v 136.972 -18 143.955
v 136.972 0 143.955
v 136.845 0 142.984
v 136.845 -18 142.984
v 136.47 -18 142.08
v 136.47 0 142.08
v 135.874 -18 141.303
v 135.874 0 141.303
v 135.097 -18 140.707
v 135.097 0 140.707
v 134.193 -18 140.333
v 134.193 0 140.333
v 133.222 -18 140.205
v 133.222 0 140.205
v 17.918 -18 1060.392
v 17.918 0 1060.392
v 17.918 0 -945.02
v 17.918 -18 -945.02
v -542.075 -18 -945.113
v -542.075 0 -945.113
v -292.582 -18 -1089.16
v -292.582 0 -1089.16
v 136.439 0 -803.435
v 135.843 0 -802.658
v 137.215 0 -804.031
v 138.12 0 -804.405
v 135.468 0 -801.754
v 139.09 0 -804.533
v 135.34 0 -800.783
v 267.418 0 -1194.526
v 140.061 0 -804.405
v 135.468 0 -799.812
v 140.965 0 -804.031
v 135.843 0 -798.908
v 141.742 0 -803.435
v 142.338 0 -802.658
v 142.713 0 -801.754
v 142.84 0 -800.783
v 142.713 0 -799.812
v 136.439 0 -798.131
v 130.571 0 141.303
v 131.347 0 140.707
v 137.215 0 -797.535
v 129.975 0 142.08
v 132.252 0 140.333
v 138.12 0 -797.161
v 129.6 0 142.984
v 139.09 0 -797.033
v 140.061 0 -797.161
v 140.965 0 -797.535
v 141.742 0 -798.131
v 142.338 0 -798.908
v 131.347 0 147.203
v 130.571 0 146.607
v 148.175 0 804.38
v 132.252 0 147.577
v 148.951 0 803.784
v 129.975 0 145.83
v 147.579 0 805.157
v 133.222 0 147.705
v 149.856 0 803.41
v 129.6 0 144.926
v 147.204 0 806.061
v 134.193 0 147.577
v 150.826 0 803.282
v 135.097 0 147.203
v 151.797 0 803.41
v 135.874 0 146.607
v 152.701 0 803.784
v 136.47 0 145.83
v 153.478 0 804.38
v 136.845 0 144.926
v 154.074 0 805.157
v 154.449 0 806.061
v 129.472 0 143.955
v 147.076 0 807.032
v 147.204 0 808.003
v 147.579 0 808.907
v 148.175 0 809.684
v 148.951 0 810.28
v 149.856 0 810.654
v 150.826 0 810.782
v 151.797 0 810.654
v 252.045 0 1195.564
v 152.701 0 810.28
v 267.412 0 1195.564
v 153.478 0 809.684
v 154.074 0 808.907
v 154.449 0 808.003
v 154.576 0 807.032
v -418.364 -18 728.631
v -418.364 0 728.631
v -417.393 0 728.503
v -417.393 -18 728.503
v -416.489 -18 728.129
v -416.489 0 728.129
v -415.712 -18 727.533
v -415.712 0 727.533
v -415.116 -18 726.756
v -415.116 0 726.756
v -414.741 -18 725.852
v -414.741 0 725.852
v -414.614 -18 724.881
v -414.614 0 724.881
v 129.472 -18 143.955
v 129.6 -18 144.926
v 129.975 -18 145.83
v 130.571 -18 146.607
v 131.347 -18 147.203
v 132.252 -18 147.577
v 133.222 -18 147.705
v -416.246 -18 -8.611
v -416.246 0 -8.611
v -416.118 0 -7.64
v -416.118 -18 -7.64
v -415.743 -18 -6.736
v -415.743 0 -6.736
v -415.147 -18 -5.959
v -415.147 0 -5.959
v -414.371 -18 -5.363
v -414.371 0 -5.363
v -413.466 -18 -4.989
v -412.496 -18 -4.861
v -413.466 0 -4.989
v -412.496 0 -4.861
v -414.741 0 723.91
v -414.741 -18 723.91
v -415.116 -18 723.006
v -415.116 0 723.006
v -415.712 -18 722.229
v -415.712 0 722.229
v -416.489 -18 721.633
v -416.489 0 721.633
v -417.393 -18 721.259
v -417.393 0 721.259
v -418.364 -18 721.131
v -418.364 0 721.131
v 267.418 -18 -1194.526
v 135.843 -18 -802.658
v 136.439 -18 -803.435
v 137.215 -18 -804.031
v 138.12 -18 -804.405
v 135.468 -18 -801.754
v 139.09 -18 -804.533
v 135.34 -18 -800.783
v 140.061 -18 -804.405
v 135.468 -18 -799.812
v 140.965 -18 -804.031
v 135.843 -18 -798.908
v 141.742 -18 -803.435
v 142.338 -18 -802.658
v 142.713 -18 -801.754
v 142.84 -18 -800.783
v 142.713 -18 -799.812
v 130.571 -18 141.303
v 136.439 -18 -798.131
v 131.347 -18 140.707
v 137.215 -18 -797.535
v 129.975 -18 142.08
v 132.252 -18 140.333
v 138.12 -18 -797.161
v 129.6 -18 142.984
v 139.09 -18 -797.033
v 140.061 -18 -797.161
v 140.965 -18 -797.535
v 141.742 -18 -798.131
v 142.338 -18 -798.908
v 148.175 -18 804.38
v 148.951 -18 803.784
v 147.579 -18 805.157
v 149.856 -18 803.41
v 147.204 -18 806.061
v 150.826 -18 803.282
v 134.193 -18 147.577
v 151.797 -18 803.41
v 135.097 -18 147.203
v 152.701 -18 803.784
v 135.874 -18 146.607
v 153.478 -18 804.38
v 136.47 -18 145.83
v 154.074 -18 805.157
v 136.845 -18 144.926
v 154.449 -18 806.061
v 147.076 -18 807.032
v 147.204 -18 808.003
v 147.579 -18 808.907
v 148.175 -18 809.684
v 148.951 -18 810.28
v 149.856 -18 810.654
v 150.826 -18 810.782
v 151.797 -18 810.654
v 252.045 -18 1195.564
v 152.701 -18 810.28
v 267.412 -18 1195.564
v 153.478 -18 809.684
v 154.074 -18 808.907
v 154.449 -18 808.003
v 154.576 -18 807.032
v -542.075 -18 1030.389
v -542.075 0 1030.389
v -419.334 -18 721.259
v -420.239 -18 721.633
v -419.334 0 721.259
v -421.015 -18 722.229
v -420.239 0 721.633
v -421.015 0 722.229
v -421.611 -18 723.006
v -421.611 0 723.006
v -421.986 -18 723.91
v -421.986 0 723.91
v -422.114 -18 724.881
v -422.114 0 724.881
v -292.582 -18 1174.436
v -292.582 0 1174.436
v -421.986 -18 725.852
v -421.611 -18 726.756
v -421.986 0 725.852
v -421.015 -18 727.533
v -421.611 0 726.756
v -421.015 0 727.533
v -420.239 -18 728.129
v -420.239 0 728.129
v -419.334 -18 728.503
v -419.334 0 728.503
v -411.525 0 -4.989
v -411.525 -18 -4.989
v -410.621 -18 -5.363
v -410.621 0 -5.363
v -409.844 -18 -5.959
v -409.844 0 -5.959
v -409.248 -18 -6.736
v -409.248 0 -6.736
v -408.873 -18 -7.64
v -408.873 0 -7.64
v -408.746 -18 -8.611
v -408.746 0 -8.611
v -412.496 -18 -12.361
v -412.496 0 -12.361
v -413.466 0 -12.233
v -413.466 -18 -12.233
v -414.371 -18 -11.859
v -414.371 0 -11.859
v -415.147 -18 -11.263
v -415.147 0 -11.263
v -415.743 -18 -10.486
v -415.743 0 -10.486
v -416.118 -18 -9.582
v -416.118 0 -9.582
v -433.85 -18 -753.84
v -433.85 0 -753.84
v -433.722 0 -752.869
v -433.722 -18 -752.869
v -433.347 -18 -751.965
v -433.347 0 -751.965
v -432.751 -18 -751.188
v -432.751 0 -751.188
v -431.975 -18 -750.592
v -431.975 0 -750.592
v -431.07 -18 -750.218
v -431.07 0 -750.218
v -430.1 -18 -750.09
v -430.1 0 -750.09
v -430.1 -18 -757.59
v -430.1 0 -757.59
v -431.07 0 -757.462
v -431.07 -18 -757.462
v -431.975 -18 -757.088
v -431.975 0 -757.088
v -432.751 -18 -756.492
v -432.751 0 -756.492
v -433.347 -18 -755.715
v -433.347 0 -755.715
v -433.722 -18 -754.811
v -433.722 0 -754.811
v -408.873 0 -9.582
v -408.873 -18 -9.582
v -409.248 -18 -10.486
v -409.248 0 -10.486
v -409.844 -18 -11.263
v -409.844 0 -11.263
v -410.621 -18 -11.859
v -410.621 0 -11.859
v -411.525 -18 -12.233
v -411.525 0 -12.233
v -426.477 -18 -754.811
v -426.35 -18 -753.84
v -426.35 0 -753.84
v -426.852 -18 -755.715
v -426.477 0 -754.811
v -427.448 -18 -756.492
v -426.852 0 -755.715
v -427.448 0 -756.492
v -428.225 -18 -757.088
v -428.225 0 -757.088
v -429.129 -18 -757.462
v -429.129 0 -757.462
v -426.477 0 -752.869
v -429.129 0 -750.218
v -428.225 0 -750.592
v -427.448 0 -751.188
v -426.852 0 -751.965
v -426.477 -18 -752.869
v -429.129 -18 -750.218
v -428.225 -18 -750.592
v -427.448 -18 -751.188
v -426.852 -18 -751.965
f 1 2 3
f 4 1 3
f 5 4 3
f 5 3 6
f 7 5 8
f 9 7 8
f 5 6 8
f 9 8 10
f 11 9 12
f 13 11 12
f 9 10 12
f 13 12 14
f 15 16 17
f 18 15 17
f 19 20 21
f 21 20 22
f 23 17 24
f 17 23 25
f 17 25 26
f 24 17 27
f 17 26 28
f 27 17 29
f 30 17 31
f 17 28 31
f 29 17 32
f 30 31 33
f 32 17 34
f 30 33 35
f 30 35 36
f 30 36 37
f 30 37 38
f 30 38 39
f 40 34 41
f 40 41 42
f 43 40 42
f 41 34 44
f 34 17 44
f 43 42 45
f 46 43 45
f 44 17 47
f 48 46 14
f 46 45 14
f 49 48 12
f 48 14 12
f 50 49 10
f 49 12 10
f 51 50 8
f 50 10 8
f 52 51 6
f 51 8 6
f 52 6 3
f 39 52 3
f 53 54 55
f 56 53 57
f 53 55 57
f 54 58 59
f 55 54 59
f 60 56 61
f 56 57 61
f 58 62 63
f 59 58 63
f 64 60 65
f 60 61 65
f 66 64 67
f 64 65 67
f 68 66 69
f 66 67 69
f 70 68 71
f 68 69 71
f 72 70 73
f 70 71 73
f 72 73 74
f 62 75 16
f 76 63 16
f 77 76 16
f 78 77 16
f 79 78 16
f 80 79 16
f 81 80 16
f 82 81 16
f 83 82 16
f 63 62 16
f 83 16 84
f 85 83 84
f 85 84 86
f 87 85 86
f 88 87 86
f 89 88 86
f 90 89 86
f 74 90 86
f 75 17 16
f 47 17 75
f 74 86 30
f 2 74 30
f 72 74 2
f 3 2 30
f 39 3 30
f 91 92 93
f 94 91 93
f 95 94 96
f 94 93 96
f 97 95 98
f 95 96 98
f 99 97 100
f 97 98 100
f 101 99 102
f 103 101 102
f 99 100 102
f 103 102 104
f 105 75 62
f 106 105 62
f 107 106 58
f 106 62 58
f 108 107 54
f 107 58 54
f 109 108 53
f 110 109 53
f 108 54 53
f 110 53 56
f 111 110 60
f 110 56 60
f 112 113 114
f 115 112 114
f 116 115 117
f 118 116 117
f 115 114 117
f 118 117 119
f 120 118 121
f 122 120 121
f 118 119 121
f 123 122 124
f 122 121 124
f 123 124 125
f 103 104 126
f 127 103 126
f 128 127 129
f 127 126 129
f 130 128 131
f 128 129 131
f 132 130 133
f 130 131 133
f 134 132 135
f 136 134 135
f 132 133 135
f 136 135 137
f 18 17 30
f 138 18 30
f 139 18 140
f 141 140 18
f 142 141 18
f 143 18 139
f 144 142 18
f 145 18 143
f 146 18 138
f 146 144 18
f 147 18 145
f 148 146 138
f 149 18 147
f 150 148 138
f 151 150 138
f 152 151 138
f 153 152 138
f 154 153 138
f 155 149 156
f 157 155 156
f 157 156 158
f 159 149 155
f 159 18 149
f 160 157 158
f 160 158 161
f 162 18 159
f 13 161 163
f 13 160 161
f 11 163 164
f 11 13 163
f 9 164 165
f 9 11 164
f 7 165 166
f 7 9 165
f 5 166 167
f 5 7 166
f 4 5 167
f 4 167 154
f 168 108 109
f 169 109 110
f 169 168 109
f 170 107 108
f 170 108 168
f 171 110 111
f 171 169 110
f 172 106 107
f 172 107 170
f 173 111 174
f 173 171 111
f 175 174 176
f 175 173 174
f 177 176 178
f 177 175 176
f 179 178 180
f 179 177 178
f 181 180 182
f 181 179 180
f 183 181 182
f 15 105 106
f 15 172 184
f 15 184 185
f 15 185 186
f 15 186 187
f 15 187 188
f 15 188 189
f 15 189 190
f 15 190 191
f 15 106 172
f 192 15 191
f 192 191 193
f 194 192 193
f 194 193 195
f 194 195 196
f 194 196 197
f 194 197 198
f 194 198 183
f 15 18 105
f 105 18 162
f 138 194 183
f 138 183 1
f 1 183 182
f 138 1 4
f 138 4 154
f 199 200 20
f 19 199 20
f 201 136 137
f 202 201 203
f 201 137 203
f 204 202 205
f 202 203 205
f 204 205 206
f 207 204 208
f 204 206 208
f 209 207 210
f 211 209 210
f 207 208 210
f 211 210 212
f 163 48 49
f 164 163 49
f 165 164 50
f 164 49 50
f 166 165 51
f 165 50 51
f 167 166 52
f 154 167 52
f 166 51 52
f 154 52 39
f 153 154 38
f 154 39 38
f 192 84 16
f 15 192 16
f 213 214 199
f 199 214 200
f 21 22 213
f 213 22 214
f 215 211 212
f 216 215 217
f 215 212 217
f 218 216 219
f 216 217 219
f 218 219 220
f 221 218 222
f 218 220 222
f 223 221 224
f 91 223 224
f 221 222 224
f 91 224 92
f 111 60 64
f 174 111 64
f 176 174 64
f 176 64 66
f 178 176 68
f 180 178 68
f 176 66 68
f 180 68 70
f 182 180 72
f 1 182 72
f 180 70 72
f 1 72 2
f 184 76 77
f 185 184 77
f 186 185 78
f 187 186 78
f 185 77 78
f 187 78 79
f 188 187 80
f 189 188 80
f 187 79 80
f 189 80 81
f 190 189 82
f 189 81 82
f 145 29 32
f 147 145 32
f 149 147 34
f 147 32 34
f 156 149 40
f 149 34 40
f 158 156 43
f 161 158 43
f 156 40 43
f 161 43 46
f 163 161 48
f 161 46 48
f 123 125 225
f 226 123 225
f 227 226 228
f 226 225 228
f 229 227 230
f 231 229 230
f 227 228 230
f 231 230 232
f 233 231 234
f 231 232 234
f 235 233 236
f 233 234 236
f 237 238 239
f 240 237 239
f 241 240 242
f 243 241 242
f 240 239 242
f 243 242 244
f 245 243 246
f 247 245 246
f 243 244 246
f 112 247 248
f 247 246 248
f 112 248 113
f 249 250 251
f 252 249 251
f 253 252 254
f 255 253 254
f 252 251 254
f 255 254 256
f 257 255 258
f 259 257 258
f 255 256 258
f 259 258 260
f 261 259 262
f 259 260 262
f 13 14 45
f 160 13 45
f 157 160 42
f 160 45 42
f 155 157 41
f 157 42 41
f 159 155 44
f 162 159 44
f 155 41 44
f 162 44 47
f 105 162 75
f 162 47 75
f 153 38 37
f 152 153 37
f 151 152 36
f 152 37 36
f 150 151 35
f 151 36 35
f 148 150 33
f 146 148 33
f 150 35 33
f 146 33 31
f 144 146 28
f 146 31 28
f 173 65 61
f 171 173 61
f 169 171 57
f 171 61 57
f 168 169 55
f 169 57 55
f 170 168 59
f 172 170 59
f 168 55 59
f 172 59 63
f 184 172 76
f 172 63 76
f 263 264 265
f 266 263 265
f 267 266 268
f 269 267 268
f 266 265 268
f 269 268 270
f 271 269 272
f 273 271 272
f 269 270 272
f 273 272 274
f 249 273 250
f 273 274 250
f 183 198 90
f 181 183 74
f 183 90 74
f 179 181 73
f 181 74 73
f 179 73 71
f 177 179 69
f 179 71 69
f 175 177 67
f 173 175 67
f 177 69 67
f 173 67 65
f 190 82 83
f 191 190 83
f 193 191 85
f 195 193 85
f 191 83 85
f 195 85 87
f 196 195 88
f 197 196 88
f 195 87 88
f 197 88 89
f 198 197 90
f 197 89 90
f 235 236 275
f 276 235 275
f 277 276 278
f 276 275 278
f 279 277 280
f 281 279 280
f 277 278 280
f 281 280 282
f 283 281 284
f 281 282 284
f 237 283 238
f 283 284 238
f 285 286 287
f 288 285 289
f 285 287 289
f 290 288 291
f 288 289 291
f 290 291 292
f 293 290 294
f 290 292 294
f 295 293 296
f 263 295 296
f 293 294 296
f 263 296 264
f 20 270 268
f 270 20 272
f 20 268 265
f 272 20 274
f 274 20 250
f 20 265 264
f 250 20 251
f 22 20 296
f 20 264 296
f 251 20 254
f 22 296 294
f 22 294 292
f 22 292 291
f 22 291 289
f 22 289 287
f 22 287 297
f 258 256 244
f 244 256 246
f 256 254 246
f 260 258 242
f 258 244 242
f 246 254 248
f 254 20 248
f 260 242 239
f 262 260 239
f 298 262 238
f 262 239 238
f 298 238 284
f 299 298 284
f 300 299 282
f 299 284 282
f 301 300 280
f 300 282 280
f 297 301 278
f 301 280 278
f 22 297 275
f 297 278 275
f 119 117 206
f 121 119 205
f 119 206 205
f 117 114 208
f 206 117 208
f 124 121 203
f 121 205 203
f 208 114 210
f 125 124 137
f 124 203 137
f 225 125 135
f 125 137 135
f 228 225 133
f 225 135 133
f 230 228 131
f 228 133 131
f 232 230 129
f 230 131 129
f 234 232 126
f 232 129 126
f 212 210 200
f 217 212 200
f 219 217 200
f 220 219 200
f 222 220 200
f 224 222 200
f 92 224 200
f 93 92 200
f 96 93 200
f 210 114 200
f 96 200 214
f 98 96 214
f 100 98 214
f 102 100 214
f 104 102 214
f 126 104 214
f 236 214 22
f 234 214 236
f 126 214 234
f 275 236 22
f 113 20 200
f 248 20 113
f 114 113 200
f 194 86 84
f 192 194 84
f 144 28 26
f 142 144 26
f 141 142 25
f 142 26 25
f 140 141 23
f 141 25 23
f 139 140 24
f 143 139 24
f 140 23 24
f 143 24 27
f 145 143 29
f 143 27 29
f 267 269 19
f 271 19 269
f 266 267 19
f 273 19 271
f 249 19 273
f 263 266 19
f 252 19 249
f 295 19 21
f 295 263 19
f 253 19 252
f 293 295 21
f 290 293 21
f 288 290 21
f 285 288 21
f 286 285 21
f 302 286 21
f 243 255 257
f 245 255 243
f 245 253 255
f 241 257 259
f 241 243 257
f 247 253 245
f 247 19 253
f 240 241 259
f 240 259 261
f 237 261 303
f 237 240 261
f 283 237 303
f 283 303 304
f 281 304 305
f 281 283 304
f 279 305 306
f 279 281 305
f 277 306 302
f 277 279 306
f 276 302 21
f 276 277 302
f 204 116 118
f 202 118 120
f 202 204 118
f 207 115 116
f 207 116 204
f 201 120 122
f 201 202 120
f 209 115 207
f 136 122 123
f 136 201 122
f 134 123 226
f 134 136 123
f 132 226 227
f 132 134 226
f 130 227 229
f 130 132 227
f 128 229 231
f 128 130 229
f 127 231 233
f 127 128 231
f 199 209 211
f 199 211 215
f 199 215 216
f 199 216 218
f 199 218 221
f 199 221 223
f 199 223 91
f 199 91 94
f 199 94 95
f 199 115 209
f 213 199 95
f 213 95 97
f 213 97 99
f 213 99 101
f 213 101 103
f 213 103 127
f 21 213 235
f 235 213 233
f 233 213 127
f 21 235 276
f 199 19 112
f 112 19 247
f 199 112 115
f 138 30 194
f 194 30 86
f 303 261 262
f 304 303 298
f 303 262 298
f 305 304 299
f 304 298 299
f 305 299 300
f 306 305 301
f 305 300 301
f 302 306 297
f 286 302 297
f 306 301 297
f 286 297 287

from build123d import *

# Parameters (mm, degrees)
F1_DEPTH = 18
F2_DEPTH = 18


with BuildPart() as f1:
    # F0 (on Front) → F1 (new body)
    with BuildSketch(Plane.XZ):
        Polygon((-292.581528, -1089.160221), (-292.581526, 1174.435994), (-542.074506, 1030.389004), (-542.075497, -945.112988), align=None)
        with BuildLine():
            ThreePointArc((-433.849526, -753.840006), (-432.751176, -751.188356), (-430.099526, -750.090006))
            ThreePointArc((-430.099526, -750.090006), (-427.447876, -751.188356), (-426.349526, -753.840006))
            ThreePointArc((-426.349526, -753.840006), (-427.447876, -756.491656), (-430.099526, -757.590006))
            ThreePointArc((-430.099526, -757.590006), (-432.751176, -756.491656), (-433.849526, -753.840006))
        make_face(mode=Mode.SUBTRACT)
        with BuildLine():
            ThreePointArc((-416.245526, -8.611006), (-415.147176, -5.959356), (-412.495526, -4.861006))
            ThreePointArc((-412.495526, -4.861006), (-409.843876, -5.959356), (-408.745526, -8.611006))
            ThreePointArc((-408.745526, -8.611006), (-409.843876, -11.262656), (-412.495526, -12.361006))
            ThreePointArc((-412.495526, -12.361006), (-415.147176, -11.262656), (-416.245526, -8.611006))
        make_face(mode=Mode.SUBTRACT)
        Polygon((-428.823632, 92.789807), (-428.8264, 93.203596), (-428.829803, 93.623463), (-428.822563, 94.042433), (-428.804756, 94.460314), (-428.776457, 94.876914), (-428.737742, 95.292039), (-428.688687, 95.705497), (-428.629367, 96.117094), (-428.559858, 96.526638), (-428.480236, 96.933936), (-428.390576, 97.338795), (-428.290955, 97.741022), (-428.181447, 98.140424), (-428.062128, 98.536809), (-427.933075, 98.929984), (-427.794363, 99.319755), (-427.646067, 99.70593), (-427.488263, 100.088315), (-427.321027, 100.466719), (-427.144434, 100.840948), (-426.958561, 101.21081), (-426.763483, 101.576111), (-426.559276, 101.936658), (-426.346014, 102.292259), (-426.123775, 102.642721), (-425.892633, 102.987851), (-425.652665, 103.327456), (-425.403946, 103.661344), (-425.146551, 103.98932), (-424.880557, 104.311193), (-424.606039, 104.62677), (-424.323072, 104.935858), (-424.031733, 105.238263), (-423.651452, 105.588123), (-423.263264, 105.927644), (-422.867403, 106.256738), (-422.464103, 106.575315), (-422.053598, 106.883287), (-421.636122, 107.180564), (-421.211908, 107.467058), (-420.781192, 107.74268), (-420.344205, 108.007341), (-419.901183, 108.260952), (-419.452359, 108.503424), (-418.997968, 108.734669), (-418.538242, 108.954598), (-418.073416, 109.163121), (-417.603724, 109.36015), (-417.1294, 109.545596), (-416.650677, 109.71937), (-416.16779, 109.881384), (-415.680972, 110.031548), (-415.190457, 110.169773), (-414.69648, 110.295971), (-414.199273, 110.410053), (-413.699071, 110.51193), (-413.196108, 110.601513), (-412.690618, 110.678713), (-412.182834, 110.743441), (-411.672991, 110.795609), (-411.161322, 110.835127), (-410.648061, 110.861908), (-410.133442, 110.875861), (-409.617699, 110.876898), (-409.101067, 110.86493), (-408.539946, 110.881001), (-407.979756, 110.882779), (-407.420757, 110.870361), (-406.863207, 110.843846), (-406.307367, 110.803331), (-405.753494, 110.748914), (-405.20185, 110.680692), (-404.652692, 110.598763), (-404.10628, 110.503225), (-403.562873, 110.394174), (-403.022731, 110.27171), (-402.486113, 110.13593), (-401.953279, 109.98693), (-401.424486, 109.82481), (-400.899996, 109.649666), (-400.380067, 109.461596), (-399.864957, 109.260698), (-399.354928, 109.04707), (-398.850237, 108.820809), (-398.351145, 108.582013), (-397.85791, 108.330779), (-397.370791, 108.067206), (-396.890049, 107.79139), (-396.415942, 107.50343), (-395.948729, 107.203422), (-395.48867, 106.891466), (-395.036024, 106.567658), (-394.591051, 106.232096), (-394.154009, 105.884878), (-393.725158, 105.526101), (-393.304758, 105.155864), (-392.893067, 104.774263), (-392.602393, 104.488514), (-392.319925, 104.195899), (-392.045746, 103.896613), (-391.779936, 103.590851), (-391.522578, 103.278811), (-391.273752, 102.960687), (-391.033541, 102.636675), (-390.802025, 102.306971), (-390.579287, 101.971771), (-390.365407, 101.631271), (-390.160468, 101.285667), (-389.964551, 100.935154), (-389.777737, 100.579927), (-389.600109, 100.220184), (-389.431747, 99.85612), (-389.272733, 99.48793), (-389.123149, 99.11581), (-388.983076, 98.739956), (-388.852596, 98.360565), (-388.731791, 97.977831), (-388.620741, 97.59195), (-388.519528, 97.203119), (-388.428235, 96.811533), (-388.346942, 96.417388), (-388.275731, 96.02088), (-388.214683, 95.622204), (-388.163881, 95.221556), (-388.123405, 94.819133), (-388.093338, 94.415129), (-388.07376, 94.009741), (-388.064754, 93.603165), (-388.0664, 93.195596), (-388.070073, 92.781348), (-388.084537, 92.368236), (-388.109707, 91.956457), (-388.145499, 91.546211), (-388.191828, 91.137695), (-388.248609, 90.731108), (-388.315758, 90.326648), (-388.393192, 89.924513), (-388.480824, 89.524901), (-388.578571, 89.128012), (-388.686349, 88.734042), (-388.804072, 88.34319), (-388.931656, 87.955655), (-389.069018, 87.571634), (-389.216072, 87.191326), (-389.372733, 86.81493), (-389.538918, 86.442642), (-389.714542, 86.074663), (-389.899521, 85.711189), (-390.09377, 85.352419), (-390.297204, 84.998552), (-390.509739, 84.649785), (-390.731291, 84.306317), (-390.961775, 83.968346), (-391.201107, 83.636071), (-391.449201, 83.309689), (-391.705975, 82.989398), (-391.971343, 82.675398), (-392.24522, 82.367886), (-392.527523, 82.067061), (-392.818167, 81.77312), (-393.117067, 81.486263), (-393.526595, 81.116083), (-393.94451, 80.757104), (-394.370559, 80.409418), (-394.804488, 80.073117), (-395.246045, 79.748293), (-395.694975, 79.435036), (-396.151025, 79.13344), (-396.613942, 78.843596), (-397.083472, 78.565596), (-397.559361, 78.299531), (-398.041358, 78.045494), (-398.529207, 77.803575), (-399.022656, 77.573868), (-399.521451, 77.356463), (-400.025339, 77.151453), (-400.534067, 76.95893), (-401.04738, 76.778984), (-401.565026, 76.611708), (-402.08675, 76.457194), (-402.612301, 76.315534), (-403.141424, 76.186819), (-403.673865, 76.071141), (-404.209372, 75.968591), (-404.747692, 75.879263), (-405.288569, 75.803247), (-405.831752, 75.740635), (-406.376987, 75.69152), (-406.92402, 75.655992), (-407.472598, 75.634144), (-408.022467, 75.626068), (-408.573374, 75.631854), (-409.125067, 75.651596), (-409.639894, 75.643167), (-410.15372, 75.647818), (-410.666306, 75.665457), (-411.177416, 75.695992), (-411.686813, 75.739332), (-412.19426, 75.795385), (-412.699521, 75.864059), (-413.202358, 75.945263), (-413.702536, 76.038904), (-414.199816, 76.144891), (-414.693962, 76.263131), (-415.184738, 76.393534), (-415.671907, 76.536007), (-416.155231, 76.690458), (-416.634475, 76.856796), (-417.1094, 77.03493), (-417.579771, 77.224766), (-418.04535, 77.426213), (-418.505901, 77.639181), (-418.961186, 77.863575), (-419.41097, 78.099306), (-419.855015, 78.346281), (-420.293085, 78.604408), (-420.724942, 78.873596), (-421.150349, 79.153753), (-421.569071, 79.444786), (-421.98087, 79.746605), (-422.385509, 80.059117), (-422.782752, 80.382231), (-423.172361, 80.715854), (-423.554101, 81.059895), (-423.927733, 81.414263), (-424.218947, 81.708169), (-424.502035, 82.008762), (-424.776919, 82.315854), (-425.04352, 82.629258), (-425.30176, 82.948784), (-425.551559, 83.274245), (-425.792841, 83.605454), (-426.025525, 83.942221), (-426.249533, 84.28436), (-426.464787, 84.631682), (-426.671208, 84.983998), (-426.868718, 85.341122), (-427.057237, 85.702865), (-427.236687, 86.06904), (-427.40699, 86.439457), (-427.568067, 86.81393), (-427.719839, 87.192269), (-427.862227, 87.574288), (-427.995154, 87.959798), (-428.118541, 88.348612), (-428.232308, 88.740541), (-428.336377, 89.135396), (-428.43067, 89.532992), (-428.515108, 89.933138), (-428.589613, 90.335648), (-428.654105, 90.740333), (-428.708506, 91.147005), (-428.752738, 91.555476), (-428.786722, 91.965559), (-428.81038, 92.377066), align=None, mode=Mode.SUBTRACT)
        Polygon((-428.823632, 137.035141), (-428.8264, 137.44893), (-428.829803, 137.868796), (-428.822563, 138.287766), (-428.804756, 138.705648), (-428.776457, 139.122247), (-428.737742, 139.537372), (-428.688687, 139.95083), (-428.629367, 140.362427), (-428.559858, 140.771971), (-428.480236, 141.179269), (-428.390576, 141.584128), (-428.290955, 141.986355), (-428.181447, 142.385758), (-428.062128, 142.782143), (-427.933075, 143.175317), (-427.794363, 143.565088), (-427.646067, 143.951263), (-427.488263, 144.333649), (-427.321027, 144.712053), (-427.144434, 145.086282), (-426.958561, 145.456143), (-426.763483, 145.821444), (-426.559276, 146.181991), (-426.346014, 146.537593), (-426.123775, 146.888055), (-425.892633, 147.233185), (-425.652665, 147.57279), (-425.403946, 147.906677), (-425.146551, 148.234654), (-424.880557, 148.556527), (-424.606039, 148.872103), (-424.323072, 149.181191), (-424.031733, 149.483596), (-423.651452, 149.833456), (-423.263264, 150.172978), (-422.867403, 150.502071), (-422.464103, 150.820648), (-422.053598, 151.12862), (-421.636122, 151.425897), (-421.211908, 151.712391), (-420.781192, 151.988013), (-420.344205, 152.252674), (-419.901183, 152.506285), (-419.452359, 152.748758), (-418.997968, 152.980002), (-418.538242, 153.199931), (-418.073416, 153.408454), (-417.603724, 153.605483), (-417.1294, 153.79093), (-416.650677, 153.964704), (-416.16779, 154.126717), (-415.680972, 154.276881), (-415.190457, 154.415107), (-414.69648, 154.541305), (-414.199273, 154.655387), (-413.699071, 154.757263), (-413.196108, 154.846846), (-412.690618, 154.924046), (-412.182834, 154.988775), (-411.672991, 155.040942), (-411.161322, 155.080461), (-410.648061, 155.107241), (-410.133442, 155.121194), (-409.617699, 155.122231), (-409.101067, 155.110263), (-408.539946, 155.126334), (-407.979756, 155.128112), (-407.420757, 155.115695), (-406.863207, 155.08918), (-406.307367, 155.048665), (-405.753494, 154.994247), (-405.20185, 154.926025), (-404.652692, 154.844096), (-404.10628, 154.748558), (-403.562873, 154.639508), (-403.022731, 154.517044), (-402.486113, 154.381263), (-401.953279, 154.232264), (-401.424486, 154.070143), (-400.899996, 153.894999), (-400.380067, 153.70693), (-399.864957, 153.506032), (-399.354928, 153.292404), (-398.850237, 153.066142), (-398.351145, 152.827346), (-397.85791, 152.576113), (-397.370791, 152.312539), (-396.890049, 152.036723), (-396.415942, 151.748763), (-395.948729, 151.448756), (-395.48867, 151.136799), (-395.036024, 150.812991), (-394.591051, 150.47743), (-394.154009, 150.130211), (-393.725158, 149.771435), (-393.304758, 149.401197), (-392.893067, 149.019596), (-392.602393, 148.733848), (-392.319925, 148.441232), (-392.045746, 148.141946), (-391.779936, 147.836185), (-391.522578, 147.524144), (-391.273752, 147.20602), (-391.033541, 146.882008), (-390.802025, 146.552305), (-390.579287, 146.217105), (-390.365407, 145.876605), (-390.160468, 145.531), (-389.964551, 145.180487), (-389.777737, 144.825261), (-389.600109, 144.465517), (-389.431747, 144.101453), (-389.272733, 143.733263), (-389.123149, 143.361143), (-388.983076, 142.98529), (-388.852596, 142.605898), (-388.731791, 142.223164), (-388.620741, 141.837284), (-388.519528, 141.448452), (-388.428235, 141.056866), (-388.346942, 140.662721), (-388.275731, 140.266213), (-388.214683, 139.867537), (-388.163881, 139.466889), (-388.123405, 139.064466), (-388.093338, 138.660463), (-388.07376, 138.255075), (-388.064754, 137.848499), (-388.0664, 137.44093), (-388.070073, 137.026681), (-388.084537, 136.613569), (-388.109707, 136.20179), (-388.145499, 135.791544), (-388.191828, 135.383028), (-388.248609, 134.976441), (-388.315758, 134.571981), (-388.393192, 134.169846), (-388.480824, 133.770235), (-388.578571, 133.373345), (-388.686349, 132.979375), (-388.804072, 132.588523), (-388.931656, 132.200988), (-389.069018, 131.816967), (-389.216072, 131.43666), (-389.372733, 131.060263), (-389.538918, 130.687976), (-389.714542, 130.319996), (-389.899521, 129.956522), (-390.09377, 129.597752), (-390.297204, 129.243885), (-390.509739, 128.895118), (-390.731291, 128.55165), (-390.961775, 128.21368), (-391.201107, 127.881404), (-391.449201, 127.555022), (-391.705975, 127.234732), (-391.971343, 126.920732), (-392.24522, 126.61322), (-392.527523, 126.312394), (-392.818167, 126.018454), (-393.117067, 125.731596), (-393.526595, 125.361416), (-393.94451, 125.002437), (-394.370559, 124.654752), (-394.804488, 124.31845), (-395.246045, 123.993626), (-395.694975, 123.68037), (-396.151025, 123.378774), (-396.613942, 123.08893), (-397.083472, 122.810929), (-397.559361, 122.544864), (-398.041358, 122.290827), (-398.529207, 122.048909), (-399.022656, 121.819201), (-399.521451, 121.601797), (-400.025339, 121.396787), (-400.534067, 121.204263), (-401.04738, 121.024317), (-401.565026, 120.857042), (-402.08675, 120.702528), (-402.612301, 120.560867), (-403.141424, 120.432152), (-403.673865, 120.316474), (-404.209372, 120.213925), (-404.747692, 120.124596), (-405.288569, 120.04858), (-405.831752, 119.985969), (-406.376987, 119.936853), (-406.92402, 119.901325), (-407.472598, 119.879477), (-408.022467, 119.871401), (-408.573374, 119.877188), (-409.125067, 119.89693), (-409.639894, 119.8885), (-410.15372, 119.893151), (-410.666306, 119.91079), (-411.177416, 119.941325), (-411.686813, 119.984666), (-412.19426, 120.040719), (-412.699521, 120.109393), (-413.202358, 120.190596), (-413.702536, 120.284237), (-414.199816, 120.390224), (-414.693962, 120.508464), (-415.184738, 120.638867), (-415.671907, 120.78134), (-416.155231, 120.935792), (-416.634475, 121.10213), (-417.1094, 121.280263), (-417.579771, 121.470099), (-418.04535, 121.671547), (-418.505901, 121.884514), (-418.961186, 122.108909), (-419.41097, 122.34464), (-419.855015, 122.591614), (-420.293085, 122.849742), (-420.724942, 123.11893), (-421.150349, 123.399086), (-421.569071, 123.69012), (-421.98087, 123.991938), (-422.385509, 124.30445), (-422.782752, 124.627564), (-423.172361, 124.961187), (-423.554101, 125.305229), (-423.927733, 125.659596), (-424.218947, 125.953502), (-424.502035, 126.254096), (-424.776919, 126.561188), (-425.04352, 126.874591), (-425.30176, 127.194117), (-425.551559, 127.519579), (-425.792841, 127.850787), (-426.025525, 128.187555), (-426.249533, 128.529693), (-426.464787, 128.877015), (-426.671208, 129.229332), (-426.868718, 129.586456), (-427.057237, 129.948199), (-427.236687, 130.314373), (-427.40699, 130.68479), (-427.568067, 131.059263), (-427.719839, 131.437603), (-427.862227, 131.819622), (-427.995154, 132.205132), (-428.118541, 132.593945), (-428.232308, 132.985874), (-428.336377, 133.38073), (-428.43067, 133.778325), (-428.515108, 134.178471), (-428.589613, 134.580981), (-428.654105, 134.985666), (-428.708506, 135.392338), (-428.752738, 135.80081), (-428.786722, 136.210893), (-428.81038, 136.622399), align=None, mode=Mode.SUBTRACT)
        Polygon((-408.277067, 172.69693), (-408.277067, 190.254263), (-388.3064, 190.254263), (-388.3064, 172.69693), (-388.309804, 172.202554), (-388.338754, 171.711049), (-388.392861, 171.22335), (-388.471733, 170.740388), (-388.574981, 170.263098), (-388.702212, 169.792414), (-388.853038, 169.329269), (-389.027067, 168.874596), (-389.223908, 168.42933), (-389.443171, 167.994404), (-389.684465, 167.570751), (-389.9474, 167.159305), (-390.231585, 166.760999), (-390.536629, 166.376768), (-390.862142, 166.007545), (-391.207733, 165.654263), (-391.559241, 165.313824), (-391.926171, 164.992752), (-392.307632, 164.691415), (-392.702733, 164.41018), (-393.110585, 164.149413), (-393.530296, 163.909482), (-393.960975, 163.690754), (-394.401733, 163.493596), (-394.851679, 163.318376), (-395.309921, 163.165461), (-395.775569, 163.035217), (-396.247733, 162.928013), (-396.725522, 162.844215), (-397.208046, 162.78419), (-397.694413, 162.748306), (-398.183733, 162.73693), (-398.685294, 162.73396), (-399.184348, 162.756799), (-399.679948, 162.805068), (-400.17115, 162.878388), (-400.657008, 162.976379), (-401.136577, 163.098664), (-401.608912, 163.244863), (-402.073067, 163.414596), (-402.528097, 163.607486), (-402.973056, 163.823154), (-403.407, 164.061219), (-403.828983, 164.321305), (-404.23806, 164.60303), (-404.633285, 164.906018), (-405.013714, 165.229889), (-405.3784, 165.574263), (-405.722526, 165.934391), (-406.046655, 166.310159), (-406.350417, 166.700646), (-406.633442, 167.10493), (-406.895356, 167.522088), (-407.135791, 167.9512), (-407.354373, 168.391344), (-407.550733, 168.841596), (-407.7245, 169.301036), (-407.875301, 169.768742), (-408.002766, 170.243792), (-408.106525, 170.725263), (-408.186205, 171.212234), (-408.241436, 171.703784), (-408.271847, 172.198989), align=None, mode=Mode.SUBTRACT)
        with BuildLine():
            ThreePointArc((-422.113526, 724.880994), (-421.015176, 727.532644), (-418.363526, 728.630994))
            ThreePointArc((-418.363526, 728.630994), (-415.711876, 727.532644), (-414.613526, 724.880994))
            ThreePointArc((-414.613526, 724.880994), (-415.711876, 722.229344), (-418.363526, 721.130994))
            ThreePointArc((-418.363526, 721.130994), (-421.015176, 722.229344), (-422.113526, 724.880994))
        make_face(mode=Mode.SUBTRACT)
        Polygon((-388.3064, 190.254263), (-408.277067, 190.254263), (-408.277067, 172.69693), (-408.271847, 172.198989), (-408.241436, 171.703784), (-408.186205, 171.212234), (-408.106525, 170.725263), (-408.002766, 170.243792), (-407.875301, 169.768742), (-407.7245, 169.301036), (-407.550733, 168.841596), (-407.354373, 168.391344), (-407.135791, 167.9512), (-406.895356, 167.522088), (-406.633442, 167.10493), (-406.350417, 166.700646), (-406.046655, 166.310159), (-405.722526, 165.934391), (-405.3784, 165.574263), (-405.013714, 165.229889), (-404.633285, 164.906018), (-404.23806, 164.60303), (-403.828983, 164.321305), (-403.407, 164.061219), (-402.973056, 163.823154), (-402.528097, 163.607486), (-402.073067, 163.414596), (-401.608912, 163.244863), (-401.136577, 163.098664), (-400.657008, 162.976379), (-400.17115, 162.878388), (-399.679948, 162.805068), (-399.184348, 162.756799), (-398.685294, 162.73396), (-398.183733, 162.73693), (-397.694413, 162.748306), (-397.208046, 162.78419), (-396.725522, 162.844215), (-396.247733, 162.928013), (-395.775569, 163.035217), (-395.309921, 163.165461), (-394.851679, 163.318376), (-394.401733, 163.493596), (-393.960975, 163.690754), (-393.530296, 163.909482), (-393.110585, 164.149413), (-392.702733, 164.41018), (-392.307632, 164.691415), (-391.926171, 164.992752), (-391.559241, 165.313824), (-391.207733, 165.654263), (-390.862142, 166.007545), (-390.536629, 166.376768), (-390.231585, 166.760999), (-389.9474, 167.159305), (-389.684465, 167.570751), (-389.443171, 167.994404), (-389.223908, 168.42933), (-389.027067, 168.874596), (-388.853038, 169.329269), (-388.702212, 169.792414), (-388.574981, 170.263098), (-388.471733, 170.740388), (-388.392861, 171.22335), (-388.338754, 171.711049), (-388.309804, 172.202554), (-388.3064, 172.69693), align=None)
        Polygon((-428.829803, 137.868796), (-428.8264, 137.44893), (-428.823632, 137.035141), (-428.81038, 136.622399), (-428.786722, 136.210893), (-428.752738, 135.80081), (-428.708506, 135.392338), (-428.654105, 134.985666), (-428.589613, 134.580981), (-428.515108, 134.178471), (-428.43067, 133.778325), (-428.336377, 133.38073), (-428.232308, 132.985874), (-428.118541, 132.593945), (-427.995154, 132.205132), (-427.862227, 131.819622), (-427.719839, 131.437603), (-427.568067, 131.059263), (-427.40699, 130.68479), (-427.236687, 130.314373), (-427.057237, 129.948199), (-426.868718, 129.586456), (-426.671208, 129.229332), (-426.464787, 128.877015), (-426.249533, 128.529693), (-426.025525, 128.187555), (-425.792841, 127.850787), (-425.551559, 127.519579), (-425.30176, 127.194117), (-425.04352, 126.874591), (-424.776919, 126.561188), (-424.502035, 126.254096), (-424.218947, 125.953502), (-423.927733, 125.659596), (-423.554101, 125.305229), (-423.172361, 124.961187), (-422.782752, 124.627564), (-422.385509, 124.30445), (-421.98087, 123.991938), (-421.569071, 123.69012), (-421.150349, 123.399086), (-420.724942, 123.11893), (-420.293085, 122.849742), (-419.855015, 122.591614), (-419.41097, 122.34464), (-418.961186, 122.108909), (-418.505901, 121.884514), (-418.04535, 121.671547), (-417.579771, 121.470099), (-417.1094, 121.280263), (-416.634475, 121.10213), (-416.155231, 120.935792), (-415.671907, 120.78134), (-415.184738, 120.638867), (-414.693962, 120.508464), (-414.199816, 120.390224), (-413.702536, 120.284237), (-413.202358, 120.190596), (-412.699521, 120.109393), (-412.19426, 120.040719), (-411.686813, 119.984666), (-411.177416, 119.941325), (-410.666306, 119.91079), (-410.15372, 119.893151), (-409.639894, 119.8885), (-409.125067, 119.89693), (-408.573374, 119.877188), (-408.022467, 119.871401), (-407.472598, 119.879477), (-406.92402, 119.901325), (-406.376987, 119.936853), (-405.831752, 119.985969), (-405.288569, 120.04858), (-404.747692, 120.124596), (-404.209372, 120.213925), (-403.673865, 120.316474), (-403.141424, 120.432152), (-402.612301, 120.560867), (-402.08675, 120.702528), (-401.565026, 120.857042), (-401.04738, 121.024317), (-400.534067, 121.204263), (-400.025339, 121.396787), (-399.521451, 121.601797), (-399.022656, 121.819201), (-398.529207, 122.048909), (-398.041358, 122.290827), (-397.559361, 122.544864), (-397.083472, 122.810929), (-396.613942, 123.08893), (-396.151025, 123.378774), (-395.694975, 123.68037), (-395.246045, 123.993626), (-394.804488, 124.31845), (-394.370559, 124.654752), (-393.94451, 125.002437), (-393.526595, 125.361416), (-393.117067, 125.731596), (-392.818167, 126.018454), (-392.527523, 126.312394), (-392.24522, 126.61322), (-391.971343, 126.920732), (-391.705975, 127.234732), (-391.449201, 127.555022), (-391.201107, 127.881404), (-390.961775, 128.21368), (-390.731291, 128.55165), (-390.509739, 128.895118), (-390.297204, 129.243885), (-390.09377, 129.597752), (-389.899521, 129.956522), (-389.714542, 130.319996), (-389.538918, 130.687976), (-389.372733, 131.060263), (-389.216072, 131.43666), (-389.069018, 131.816967), (-388.931656, 132.200988), (-388.804072, 132.588523), (-388.686349, 132.979375), (-388.578571, 133.373345), (-388.480824, 133.770235), (-388.393192, 134.169846), (-388.315758, 134.571981), (-388.248609, 134.976441), (-388.191828, 135.383028), (-388.145499, 135.791544), (-388.109707, 136.20179), (-388.084537, 136.613569), (-388.070073, 137.026681), (-388.0664, 137.44093), (-388.064754, 137.848499), (-388.07376, 138.255075), (-388.093338, 138.660463), (-388.123405, 139.064466), (-388.163881, 139.466889), (-388.214683, 139.867537), (-388.275731, 140.266213), (-388.346942, 140.662721), (-388.428235, 141.056866), (-388.519528, 141.448452), (-388.620741, 141.837284), (-388.731791, 142.223164), (-388.852596, 142.605898), (-388.983076, 142.98529), (-389.123149, 143.361143), (-389.272733, 143.733263), (-389.431747, 144.101453), (-389.600109, 144.465517), (-389.777737, 144.825261), (-389.964551, 145.180487), (-390.160468, 145.531), (-390.365407, 145.876605), (-390.579287, 146.217105), (-390.802025, 146.552305), (-391.033541, 146.882008), (-391.273752, 147.20602), (-391.522578, 147.524144), (-391.779936, 147.836185), (-392.045746, 148.141946), (-392.319925, 148.441232), (-392.602393, 148.733848), (-392.893067, 149.019596), (-393.304758, 149.401197), (-393.725158, 149.771435), (-394.154009, 150.130211), (-394.591051, 150.47743), (-395.036024, 150.812991), (-395.48867, 151.136799), (-395.948729, 151.448756), (-396.415942, 151.748763), (-396.890049, 152.036723), (-397.370791, 152.312539), (-397.85791, 152.576113), (-398.351145, 152.827346), (-398.850237, 153.066142), (-399.354928, 153.292404), (-399.864957, 153.506032), (-400.380067, 153.70693), (-400.899996, 153.894999), (-401.424486, 154.070143), (-401.953279, 154.232264), (-402.486113, 154.381263), (-403.022731, 154.517044), (-403.562873, 154.639508), (-404.10628, 154.748558), (-404.652692, 154.844096), (-405.20185, 154.926025), (-405.753494, 154.994247), (-406.307367, 155.048665), (-406.863207, 155.08918), (-407.420757, 155.115695), (-407.979756, 155.128112), (-408.539946, 155.126334), (-409.101067, 155.110263), (-409.617699, 155.122231), (-410.133442, 155.121194), (-410.648061, 155.107241), (-411.161322, 155.080461), (-411.672991, 155.040942), (-412.182834, 154.988775), (-412.690618, 154.924046), (-413.196108, 154.846846), (-413.699071, 154.757263), (-414.199273, 154.655387), (-414.69648, 154.541305), (-415.190457, 154.415107), (-415.680972, 154.276881), (-416.16779, 154.126717), (-416.650677, 153.964704), (-417.1294, 153.79093), (-417.603724, 153.605483), (-418.073416, 153.408454), (-418.538242, 153.199931), (-418.997968, 152.980002), (-419.452359, 152.748758), (-419.901183, 152.506285), (-420.344205, 152.252674), (-420.781192, 151.988013), (-421.211908, 151.712391), (-421.636122, 151.425897), (-422.053598, 151.12862), (-422.464103, 150.820648), (-422.867403, 150.502071), (-423.263264, 150.172978), (-423.651452, 149.833456), (-424.031733, 149.483596), (-424.323072, 149.181191), (-424.606039, 148.872103), (-424.880557, 148.556527), (-425.146551, 148.234654), (-425.403946, 147.906677), (-425.652665, 147.57279), (-425.892633, 147.233185), (-426.123775, 146.888055), (-426.346014, 146.537593), (-426.559276, 146.181991), (-426.763483, 145.821444), (-426.958561, 145.456143), (-427.144434, 145.086282), (-427.321027, 144.712053), (-427.488263, 144.333649), (-427.646067, 143.951263), (-427.794363, 143.565088), (-427.933075, 143.175317), (-428.062128, 142.782143), (-428.181447, 142.385758), (-428.290955, 141.986355), (-428.390576, 141.584128), (-428.480236, 141.179269), (-428.559858, 140.771971), (-428.629367, 140.362427), (-428.688687, 139.95083), (-428.737742, 139.537372), (-428.776457, 139.122247), (-428.804756, 138.705648), (-428.822563, 138.287766), align=None)
        Polygon((-428.829803, 93.623463), (-428.8264, 93.203596), (-428.823632, 92.789807), (-428.81038, 92.377066), (-428.786722, 91.965559), (-428.752738, 91.555476), (-428.708506, 91.147005), (-428.654105, 90.740333), (-428.589613, 90.335648), (-428.515108, 89.933138), (-428.43067, 89.532992), (-428.336377, 89.135396), (-428.232308, 88.740541), (-428.118541, 88.348612), (-427.995154, 87.959798), (-427.862227, 87.574288), (-427.719839, 87.192269), (-427.568067, 86.81393), (-427.40699, 86.439457), (-427.236687, 86.06904), (-427.057237, 85.702865), (-426.868718, 85.341122), (-426.671208, 84.983998), (-426.464787, 84.631682), (-426.249533, 84.28436), (-426.025525, 83.942221), (-425.792841, 83.605454), (-425.551559, 83.274245), (-425.30176, 82.948784), (-425.04352, 82.629258), (-424.776919, 82.315854), (-424.502035, 82.008762), (-424.218947, 81.708169), (-423.927733, 81.414263), (-423.554101, 81.059895), (-423.172361, 80.715854), (-422.782752, 80.382231), (-422.385509, 80.059117), (-421.98087, 79.746605), (-421.569071, 79.444786), (-421.150349, 79.153753), (-420.724942, 78.873596), (-420.293085, 78.604408), (-419.855015, 78.346281), (-419.41097, 78.099306), (-418.961186, 77.863575), (-418.505901, 77.639181), (-418.04535, 77.426213), (-417.579771, 77.224766), (-417.1094, 77.03493), (-416.634475, 76.856796), (-416.155231, 76.690458), (-415.671907, 76.536007), (-415.184738, 76.393534), (-414.693962, 76.263131), (-414.199816, 76.144891), (-413.702536, 76.038904), (-413.202358, 75.945263), (-412.699521, 75.864059), (-412.19426, 75.795385), (-411.686813, 75.739332), (-411.177416, 75.695992), (-410.666306, 75.665457), (-410.15372, 75.647818), (-409.639894, 75.643167), (-409.125067, 75.651596), (-408.573374, 75.631854), (-408.022467, 75.626068), (-407.472598, 75.634144), (-406.92402, 75.655992), (-406.376987, 75.69152), (-405.831752, 75.740635), (-405.288569, 75.803247), (-404.747692, 75.879263), (-404.209372, 75.968591), (-403.673865, 76.071141), (-403.141424, 76.186819), (-402.612301, 76.315534), (-402.08675, 76.457194), (-401.565026, 76.611708), (-401.04738, 76.778984), (-400.534067, 76.95893), (-400.025339, 77.151453), (-399.521451, 77.356463), (-399.022656, 77.573868), (-398.529207, 77.803575), (-398.041358, 78.045494), (-397.559361, 78.299531), (-397.083472, 78.565596), (-396.613942, 78.843596), (-396.151025, 79.13344), (-395.694975, 79.435036), (-395.246045, 79.748293), (-394.804488, 80.073117), (-394.370559, 80.409418), (-393.94451, 80.757104), (-393.526595, 81.116083), (-393.117067, 81.486263), (-392.818167, 81.77312), (-392.527523, 82.067061), (-392.24522, 82.367886), (-391.971343, 82.675398), (-391.705975, 82.989398), (-391.449201, 83.309689), (-391.201107, 83.636071), (-390.961775, 83.968346), (-390.731291, 84.306317), (-390.509739, 84.649785), (-390.297204, 84.998552), (-390.09377, 85.352419), (-389.899521, 85.711189), (-389.714542, 86.074663), (-389.538918, 86.442642), (-389.372733, 86.81493), (-389.216072, 87.191326), (-389.069018, 87.571634), (-388.931656, 87.955655), (-388.804072, 88.34319), (-388.686349, 88.734042), (-388.578571, 89.128012), (-388.480824, 89.524901), (-388.393192, 89.924513), (-388.315758, 90.326648), (-388.248609, 90.731108), (-388.191828, 91.137695), (-388.145499, 91.546211), (-388.109707, 91.956457), (-388.084537, 92.368236), (-388.070073, 92.781348), (-388.0664, 93.195596), (-388.064754, 93.603165), (-388.07376, 94.009741), (-388.093338, 94.415129), (-388.123405, 94.819133), (-388.163881, 95.221556), (-388.214683, 95.622204), (-388.275731, 96.02088), (-388.346942, 96.417388), (-388.428235, 96.811533), (-388.519528, 97.203119), (-388.620741, 97.59195), (-388.731791, 97.977831), (-388.852596, 98.360565), (-388.983076, 98.739956), (-389.123149, 99.11581), (-389.272733, 99.48793), (-389.431747, 99.85612), (-389.600109, 100.220184), (-389.777737, 100.579927), (-389.964551, 100.935154), (-390.160468, 101.285667), (-390.365407, 101.631271), (-390.579287, 101.971771), (-390.802025, 102.306971), (-391.033541, 102.636675), (-391.273752, 102.960687), (-391.522578, 103.278811), (-391.779936, 103.590851), (-392.045746, 103.896613), (-392.319925, 104.195899), (-392.602393, 104.488514), (-392.893067, 104.774263), (-393.304758, 105.155864), (-393.725158, 105.526101), (-394.154009, 105.884878), (-394.591051, 106.232096), (-395.036024, 106.567658), (-395.48867, 106.891466), (-395.948729, 107.203422), (-396.415942, 107.50343), (-396.890049, 107.79139), (-397.370791, 108.067206), (-397.85791, 108.330779), (-398.351145, 108.582013), (-398.850237, 108.820809), (-399.354928, 109.04707), (-399.864957, 109.260698), (-400.380067, 109.461596), (-400.899996, 109.649666), (-401.424486, 109.82481), (-401.953279, 109.98693), (-402.486113, 110.13593), (-403.022731, 110.27171), (-403.562873, 110.394174), (-404.10628, 110.503225), (-404.652692, 110.598763), (-405.20185, 110.680692), (-405.753494, 110.748914), (-406.307367, 110.803331), (-406.863207, 110.843846), (-407.420757, 110.870361), (-407.979756, 110.882779), (-408.539946, 110.881001), (-409.101067, 110.86493), (-409.617699, 110.876898), (-410.133442, 110.875861), (-410.648061, 110.861908), (-411.161322, 110.835127), (-411.672991, 110.795609), (-412.182834, 110.743441), (-412.690618, 110.678713), (-413.196108, 110.601513), (-413.699071, 110.51193), (-414.199273, 110.410053), (-414.69648, 110.295971), (-415.190457, 110.169773), (-415.680972, 110.031548), (-416.16779, 109.881384), (-416.650677, 109.71937), (-417.1294, 109.545596), (-417.603724, 109.36015), (-418.073416, 109.163121), (-418.538242, 108.954598), (-418.997968, 108.734669), (-419.452359, 108.503424), (-419.901183, 108.260952), (-420.344205, 108.007341), (-420.781192, 107.74268), (-421.211908, 107.467058), (-421.636122, 107.180564), (-422.053598, 106.883287), (-422.464103, 106.575315), (-422.867403, 106.256738), (-423.263264, 105.927644), (-423.651452, 105.588123), (-424.031733, 105.238263), (-424.323072, 104.935858), (-424.606039, 104.62677), (-424.880557, 104.311193), (-425.146551, 103.98932), (-425.403946, 103.661344), (-425.652665, 103.327456), (-425.892633, 102.987851), (-426.123775, 102.642721), (-426.346014, 102.292259), (-426.559276, 101.936658), (-426.763483, 101.576111), (-426.958561, 101.21081), (-427.144434, 100.840948), (-427.321027, 100.466719), (-427.488263, 100.088315), (-427.646067, 99.70593), (-427.794363, 99.319755), (-427.933075, 98.929984), (-428.062128, 98.536809), (-428.181447, 98.140424), (-428.290955, 97.741022), (-428.390576, 97.338795), (-428.480236, 96.933936), (-428.559858, 96.526638), (-428.629367, 96.117094), (-428.688687, 95.705497), (-428.737742, 95.292039), (-428.776457, 94.876914), (-428.804756, 94.460314), (-428.822563, 94.042433), align=None)
    extrude(amount=F1_DEPTH)


with BuildPart() as f2:
    # F0 (on Front) → F2 (new body)
    with BuildSketch(Plane.XZ):
        Polygon((267.412374, 1195.564006), (252.045387, 1195.564006), (17.917503, 1060.392228), (17.917503, -945.019821), (267.418474, -1194.525969), align=None)
        with BuildLine():
            ThreePointArc((135.340474, -800.783006), (136.438824, -798.131356), (139.090474, -797.033006))
            ThreePointArc((139.090474, -797.033006), (141.742124, -798.131356), (142.840474, -800.783006))
            ThreePointArc((142.840474, -800.783006), (141.742124, -803.434656), (139.090474, -804.533006))
            ThreePointArc((139.090474, -804.533006), (136.438824, -803.434656), (135.340474, -800.783006))
        make_face(mode=Mode.SUBTRACT)
        Polygon((146.818093, -17.164794), (132.159427, -17.164794), (132.159427, 22.811206), (146.818093, 22.811206), (147.165512, 22.794757), (147.511665, 22.769461), (147.856394, 22.735391), (148.199541, 22.692622), (148.540951, 22.641228), (148.880464, 22.581284), (149.217925, 22.512863), (149.553177, 22.436039), (149.886061, 22.350887), (150.21642, 22.257482), (150.544098, 22.155896), (150.868937, 22.046206), (151.19078, 21.928484), (151.50947, 21.802805), (151.824849, 21.669243), (152.13676, 21.527872), (152.445046, 21.378768), (152.74955, 21.222003), (153.050115, 21.057652), (153.346583, 20.885789), (153.638797, 20.706489), (153.9266, 20.519825), (154.209834, 20.325873), (154.488343, 20.124706), (154.761969, 19.916398), (155.030556, 19.701023), (155.293944, 19.478657), (155.551979, 19.249372), (155.804501, 19.013244), (156.051355, 18.770346), (156.292383, 18.520753), (156.527427, 18.264539), (156.928237, 17.852099), (157.317597, 17.430453), (157.695399, 16.999866), (158.061536, 16.560602), (158.415902, 16.112923), (158.75839, 15.657094), (159.088892, 15.193378), (159.407302, 14.722039), (159.713512, 14.243341), (160.007417, 13.757547), (160.288908, 13.264921), (160.55788, 12.765727), (160.814224, 12.260228), (161.057835, 11.748687), (161.288605, 11.23137), (161.506427, 10.708539), (161.711194, 10.180458), (161.9028, 9.647391), (162.081137, 9.109601), (162.246099, 8.567352), (162.397578, 8.020907), (162.535468, 7.470531), (162.659661, 6.916487), (162.770052, 6.359039), (162.866532, 5.79845), (162.948995, 5.234984), (163.017334, 4.668905), (163.071442, 4.100477), (163.111213, 3.529962), (163.136538, 2.957625), (163.147312, 2.383729), (163.143427, 1.808539), (163.15512, 1.326622), (163.154752, 0.845515), (163.142404, 0.365434), (163.118156, -0.113404), (163.082087, -0.590783), (163.034278, -1.066486), (162.974809, -1.540298), (162.90376, -2.012003), (162.821211, -2.481383), (162.727242, -2.948222), (162.621933, -3.412305), (162.505364, -3.873414), (162.377616, -4.331334), (162.238768, -4.785848), (162.0889, -5.236741), (161.928093, -5.683794), (161.756427, -6.126793), (161.573981, -6.565522), (161.380836, -6.999762), (161.177072, -7.4293), (160.962769, -7.853917), (160.738007, -8.273398), (160.502866, -8.687526), (160.257427, -9.096086), (160.001768, -9.49886), (159.735971, -9.895634), (159.460115, -10.286189), (159.174281, -10.67031), (158.878548, -11.047781), (158.572997, -11.418385), (158.257708, -11.781906), (157.93276, -12.138128), (157.658976, -12.422435), (157.378738, -12.699306), (157.092217, -12.968663), (156.799583, -13.23043), (156.501008, -13.484528), (156.196662, -13.730882), (155.886717, -13.969413), (155.571343, -14.200044), (155.250712, -14.422699), (154.924993, -14.637301), (154.594358, -14.843771), (154.258979, -15.042034), (153.919025, -15.232011), (153.574668, -15.413626), (153.226078, -15.586802), (152.873427, -15.751461), (152.516885, -15.907526), (152.156623, -16.054921), (151.792813, -16.193567), (151.425625, -16.323388), (151.055229, -16.444307), (150.681798, -16.556246), (150.305501, -16.659129), (149.92651, -16.752878), (149.544995, -16.837416), (149.161128, -16.912665), (148.77508, -16.97855), (148.38702, -17.034992), (147.997121, -17.081915), (147.605553, -17.119241), (147.212487, -17.146893), align=None, mode=Mode.SUBTRACT)
        with BuildLine():
            ThreePointArc((129.472474, 143.954994), (130.570824, 146.606644), (133.222474, 147.704994))
            ThreePointArc((133.222474, 147.704994), (135.874124, 146.606644), (136.972474, 143.954994))
            ThreePointArc((136.972474, 143.954994), (135.874124, 141.303344), (133.222474, 140.204994))
            ThreePointArc((133.222474, 140.204994), (130.570824, 141.303344), (129.472474, 143.954994))
        make_face(mode=Mode.SUBTRACT)
        with BuildLine():
            ThreePointArc((147.076474, 807.031994), (148.174824, 809.683644), (150.826474, 810.781994))
            ThreePointArc((150.826474, 810.781994), (153.478124, 809.683644), (154.576474, 807.031994))
            ThreePointArc((154.576474, 807.031994), (153.478124, 804.380344), (150.826474, 803.281994))
            ThreePointArc((150.826474, 803.281994), (148.174824, 804.380344), (147.076474, 807.031994))
        make_face(mode=Mode.SUBTRACT)
        Polygon((132.159427, 22.811206), (132.159427, -17.164794), (146.818093, -17.164794), (147.212487, -17.146893), (147.605553, -17.119241), (147.997121, -17.081915), (148.38702, -17.034992), (148.77508, -16.97855), (149.161128, -16.912665), (149.544995, -16.837416), (149.92651, -16.752878), (150.305501, -16.659129), (150.681798, -16.556246), (151.055229, -16.444307), (151.425625, -16.323388), (151.792813, -16.193567), (152.156623, -16.054921), (152.516885, -15.907526), (152.873427, -15.751461), (153.226078, -15.586802), (153.574668, -15.413626), (153.919025, -15.232011), (154.258979, -15.042034), (154.594358, -14.843771), (154.924993, -14.637301), (155.250712, -14.422699), (155.571343, -14.200044), (155.886717, -13.969413), (156.196662, -13.730882), (156.501008, -13.484528), (156.799583, -13.23043), (157.092217, -12.968663), (157.378738, -12.699306), (157.658976, -12.422435), (157.93276, -12.138128), (158.257708, -11.781906), (158.572997, -11.418385), (158.878548, -11.047781), (159.174281, -10.67031), (159.460115, -10.286189), (159.735971, -9.895634), (160.001768, -9.49886), (160.257427, -9.096086), (160.502866, -8.687526), (160.738007, -8.273398), (160.962769, -7.853917), (161.177072, -7.4293), (161.380836, -6.999762), (161.573981, -6.565522), (161.756427, -6.126793), (161.928093, -5.683794), (162.0889, -5.236741), (162.238768, -4.785848), (162.377616, -4.331334), (162.505364, -3.873414), (162.621933, -3.412305), (162.727242, -2.948222), (162.821211, -2.481383), (162.90376, -2.012003), (162.974809, -1.540298), (163.034278, -1.066486), (163.082087, -0.590783), (163.118156, -0.113404), (163.142404, 0.365434), (163.154752, 0.845515), (163.15512, 1.326622), (163.143427, 1.808539), (163.147312, 2.383729), (163.136538, 2.957625), (163.111213, 3.529962), (163.071442, 4.100477), (163.017334, 4.668905), (162.948995, 5.234984), (162.866532, 5.79845), (162.770052, 6.359039), (162.659661, 6.916487), (162.535468, 7.470531), (162.397578, 8.020907), (162.246099, 8.567352), (162.081137, 9.109601), (161.9028, 9.647391), (161.711194, 10.180458), (161.506427, 10.708539), (161.288605, 11.23137), (161.057835, 11.748687), (160.814224, 12.260228), (160.55788, 12.765727), (160.288908, 13.264921), (160.007417, 13.757547), (159.713512, 14.243341), (159.407302, 14.722039), (159.088892, 15.193378), (158.75839, 15.657094), (158.415902, 16.112923), (158.061536, 16.560602), (157.695399, 16.999866), (157.317597, 17.430453), (156.928237, 17.852099), (156.527427, 18.264539), (156.292383, 18.520753), (156.051355, 18.770346), (155.804501, 19.013244), (155.551979, 19.249372), (155.293944, 19.478657), (155.030556, 19.701023), (154.761969, 19.916398), (154.488343, 20.124706), (154.209834, 20.325873), (153.9266, 20.519825), (153.638797, 20.706489), (153.346583, 20.885789), (153.050115, 21.057652), (152.74955, 21.222003), (152.445046, 21.378768), (152.13676, 21.527872), (151.824849, 21.669243), (151.50947, 21.802805), (151.19078, 21.928484), (150.868937, 22.046206), (150.544098, 22.155896), (150.21642, 22.257482), (149.886061, 22.350887), (149.553177, 22.436039), (149.217925, 22.512863), (148.880464, 22.581284), (148.540951, 22.641228), (148.199541, 22.692622), (147.856394, 22.735391), (147.511665, 22.769461), (147.165512, 22.794757), (146.818093, 22.811206), align=None)
    extrude(amount=F2_DEPTH)


solid = Compound([f1.part, f2.part])
